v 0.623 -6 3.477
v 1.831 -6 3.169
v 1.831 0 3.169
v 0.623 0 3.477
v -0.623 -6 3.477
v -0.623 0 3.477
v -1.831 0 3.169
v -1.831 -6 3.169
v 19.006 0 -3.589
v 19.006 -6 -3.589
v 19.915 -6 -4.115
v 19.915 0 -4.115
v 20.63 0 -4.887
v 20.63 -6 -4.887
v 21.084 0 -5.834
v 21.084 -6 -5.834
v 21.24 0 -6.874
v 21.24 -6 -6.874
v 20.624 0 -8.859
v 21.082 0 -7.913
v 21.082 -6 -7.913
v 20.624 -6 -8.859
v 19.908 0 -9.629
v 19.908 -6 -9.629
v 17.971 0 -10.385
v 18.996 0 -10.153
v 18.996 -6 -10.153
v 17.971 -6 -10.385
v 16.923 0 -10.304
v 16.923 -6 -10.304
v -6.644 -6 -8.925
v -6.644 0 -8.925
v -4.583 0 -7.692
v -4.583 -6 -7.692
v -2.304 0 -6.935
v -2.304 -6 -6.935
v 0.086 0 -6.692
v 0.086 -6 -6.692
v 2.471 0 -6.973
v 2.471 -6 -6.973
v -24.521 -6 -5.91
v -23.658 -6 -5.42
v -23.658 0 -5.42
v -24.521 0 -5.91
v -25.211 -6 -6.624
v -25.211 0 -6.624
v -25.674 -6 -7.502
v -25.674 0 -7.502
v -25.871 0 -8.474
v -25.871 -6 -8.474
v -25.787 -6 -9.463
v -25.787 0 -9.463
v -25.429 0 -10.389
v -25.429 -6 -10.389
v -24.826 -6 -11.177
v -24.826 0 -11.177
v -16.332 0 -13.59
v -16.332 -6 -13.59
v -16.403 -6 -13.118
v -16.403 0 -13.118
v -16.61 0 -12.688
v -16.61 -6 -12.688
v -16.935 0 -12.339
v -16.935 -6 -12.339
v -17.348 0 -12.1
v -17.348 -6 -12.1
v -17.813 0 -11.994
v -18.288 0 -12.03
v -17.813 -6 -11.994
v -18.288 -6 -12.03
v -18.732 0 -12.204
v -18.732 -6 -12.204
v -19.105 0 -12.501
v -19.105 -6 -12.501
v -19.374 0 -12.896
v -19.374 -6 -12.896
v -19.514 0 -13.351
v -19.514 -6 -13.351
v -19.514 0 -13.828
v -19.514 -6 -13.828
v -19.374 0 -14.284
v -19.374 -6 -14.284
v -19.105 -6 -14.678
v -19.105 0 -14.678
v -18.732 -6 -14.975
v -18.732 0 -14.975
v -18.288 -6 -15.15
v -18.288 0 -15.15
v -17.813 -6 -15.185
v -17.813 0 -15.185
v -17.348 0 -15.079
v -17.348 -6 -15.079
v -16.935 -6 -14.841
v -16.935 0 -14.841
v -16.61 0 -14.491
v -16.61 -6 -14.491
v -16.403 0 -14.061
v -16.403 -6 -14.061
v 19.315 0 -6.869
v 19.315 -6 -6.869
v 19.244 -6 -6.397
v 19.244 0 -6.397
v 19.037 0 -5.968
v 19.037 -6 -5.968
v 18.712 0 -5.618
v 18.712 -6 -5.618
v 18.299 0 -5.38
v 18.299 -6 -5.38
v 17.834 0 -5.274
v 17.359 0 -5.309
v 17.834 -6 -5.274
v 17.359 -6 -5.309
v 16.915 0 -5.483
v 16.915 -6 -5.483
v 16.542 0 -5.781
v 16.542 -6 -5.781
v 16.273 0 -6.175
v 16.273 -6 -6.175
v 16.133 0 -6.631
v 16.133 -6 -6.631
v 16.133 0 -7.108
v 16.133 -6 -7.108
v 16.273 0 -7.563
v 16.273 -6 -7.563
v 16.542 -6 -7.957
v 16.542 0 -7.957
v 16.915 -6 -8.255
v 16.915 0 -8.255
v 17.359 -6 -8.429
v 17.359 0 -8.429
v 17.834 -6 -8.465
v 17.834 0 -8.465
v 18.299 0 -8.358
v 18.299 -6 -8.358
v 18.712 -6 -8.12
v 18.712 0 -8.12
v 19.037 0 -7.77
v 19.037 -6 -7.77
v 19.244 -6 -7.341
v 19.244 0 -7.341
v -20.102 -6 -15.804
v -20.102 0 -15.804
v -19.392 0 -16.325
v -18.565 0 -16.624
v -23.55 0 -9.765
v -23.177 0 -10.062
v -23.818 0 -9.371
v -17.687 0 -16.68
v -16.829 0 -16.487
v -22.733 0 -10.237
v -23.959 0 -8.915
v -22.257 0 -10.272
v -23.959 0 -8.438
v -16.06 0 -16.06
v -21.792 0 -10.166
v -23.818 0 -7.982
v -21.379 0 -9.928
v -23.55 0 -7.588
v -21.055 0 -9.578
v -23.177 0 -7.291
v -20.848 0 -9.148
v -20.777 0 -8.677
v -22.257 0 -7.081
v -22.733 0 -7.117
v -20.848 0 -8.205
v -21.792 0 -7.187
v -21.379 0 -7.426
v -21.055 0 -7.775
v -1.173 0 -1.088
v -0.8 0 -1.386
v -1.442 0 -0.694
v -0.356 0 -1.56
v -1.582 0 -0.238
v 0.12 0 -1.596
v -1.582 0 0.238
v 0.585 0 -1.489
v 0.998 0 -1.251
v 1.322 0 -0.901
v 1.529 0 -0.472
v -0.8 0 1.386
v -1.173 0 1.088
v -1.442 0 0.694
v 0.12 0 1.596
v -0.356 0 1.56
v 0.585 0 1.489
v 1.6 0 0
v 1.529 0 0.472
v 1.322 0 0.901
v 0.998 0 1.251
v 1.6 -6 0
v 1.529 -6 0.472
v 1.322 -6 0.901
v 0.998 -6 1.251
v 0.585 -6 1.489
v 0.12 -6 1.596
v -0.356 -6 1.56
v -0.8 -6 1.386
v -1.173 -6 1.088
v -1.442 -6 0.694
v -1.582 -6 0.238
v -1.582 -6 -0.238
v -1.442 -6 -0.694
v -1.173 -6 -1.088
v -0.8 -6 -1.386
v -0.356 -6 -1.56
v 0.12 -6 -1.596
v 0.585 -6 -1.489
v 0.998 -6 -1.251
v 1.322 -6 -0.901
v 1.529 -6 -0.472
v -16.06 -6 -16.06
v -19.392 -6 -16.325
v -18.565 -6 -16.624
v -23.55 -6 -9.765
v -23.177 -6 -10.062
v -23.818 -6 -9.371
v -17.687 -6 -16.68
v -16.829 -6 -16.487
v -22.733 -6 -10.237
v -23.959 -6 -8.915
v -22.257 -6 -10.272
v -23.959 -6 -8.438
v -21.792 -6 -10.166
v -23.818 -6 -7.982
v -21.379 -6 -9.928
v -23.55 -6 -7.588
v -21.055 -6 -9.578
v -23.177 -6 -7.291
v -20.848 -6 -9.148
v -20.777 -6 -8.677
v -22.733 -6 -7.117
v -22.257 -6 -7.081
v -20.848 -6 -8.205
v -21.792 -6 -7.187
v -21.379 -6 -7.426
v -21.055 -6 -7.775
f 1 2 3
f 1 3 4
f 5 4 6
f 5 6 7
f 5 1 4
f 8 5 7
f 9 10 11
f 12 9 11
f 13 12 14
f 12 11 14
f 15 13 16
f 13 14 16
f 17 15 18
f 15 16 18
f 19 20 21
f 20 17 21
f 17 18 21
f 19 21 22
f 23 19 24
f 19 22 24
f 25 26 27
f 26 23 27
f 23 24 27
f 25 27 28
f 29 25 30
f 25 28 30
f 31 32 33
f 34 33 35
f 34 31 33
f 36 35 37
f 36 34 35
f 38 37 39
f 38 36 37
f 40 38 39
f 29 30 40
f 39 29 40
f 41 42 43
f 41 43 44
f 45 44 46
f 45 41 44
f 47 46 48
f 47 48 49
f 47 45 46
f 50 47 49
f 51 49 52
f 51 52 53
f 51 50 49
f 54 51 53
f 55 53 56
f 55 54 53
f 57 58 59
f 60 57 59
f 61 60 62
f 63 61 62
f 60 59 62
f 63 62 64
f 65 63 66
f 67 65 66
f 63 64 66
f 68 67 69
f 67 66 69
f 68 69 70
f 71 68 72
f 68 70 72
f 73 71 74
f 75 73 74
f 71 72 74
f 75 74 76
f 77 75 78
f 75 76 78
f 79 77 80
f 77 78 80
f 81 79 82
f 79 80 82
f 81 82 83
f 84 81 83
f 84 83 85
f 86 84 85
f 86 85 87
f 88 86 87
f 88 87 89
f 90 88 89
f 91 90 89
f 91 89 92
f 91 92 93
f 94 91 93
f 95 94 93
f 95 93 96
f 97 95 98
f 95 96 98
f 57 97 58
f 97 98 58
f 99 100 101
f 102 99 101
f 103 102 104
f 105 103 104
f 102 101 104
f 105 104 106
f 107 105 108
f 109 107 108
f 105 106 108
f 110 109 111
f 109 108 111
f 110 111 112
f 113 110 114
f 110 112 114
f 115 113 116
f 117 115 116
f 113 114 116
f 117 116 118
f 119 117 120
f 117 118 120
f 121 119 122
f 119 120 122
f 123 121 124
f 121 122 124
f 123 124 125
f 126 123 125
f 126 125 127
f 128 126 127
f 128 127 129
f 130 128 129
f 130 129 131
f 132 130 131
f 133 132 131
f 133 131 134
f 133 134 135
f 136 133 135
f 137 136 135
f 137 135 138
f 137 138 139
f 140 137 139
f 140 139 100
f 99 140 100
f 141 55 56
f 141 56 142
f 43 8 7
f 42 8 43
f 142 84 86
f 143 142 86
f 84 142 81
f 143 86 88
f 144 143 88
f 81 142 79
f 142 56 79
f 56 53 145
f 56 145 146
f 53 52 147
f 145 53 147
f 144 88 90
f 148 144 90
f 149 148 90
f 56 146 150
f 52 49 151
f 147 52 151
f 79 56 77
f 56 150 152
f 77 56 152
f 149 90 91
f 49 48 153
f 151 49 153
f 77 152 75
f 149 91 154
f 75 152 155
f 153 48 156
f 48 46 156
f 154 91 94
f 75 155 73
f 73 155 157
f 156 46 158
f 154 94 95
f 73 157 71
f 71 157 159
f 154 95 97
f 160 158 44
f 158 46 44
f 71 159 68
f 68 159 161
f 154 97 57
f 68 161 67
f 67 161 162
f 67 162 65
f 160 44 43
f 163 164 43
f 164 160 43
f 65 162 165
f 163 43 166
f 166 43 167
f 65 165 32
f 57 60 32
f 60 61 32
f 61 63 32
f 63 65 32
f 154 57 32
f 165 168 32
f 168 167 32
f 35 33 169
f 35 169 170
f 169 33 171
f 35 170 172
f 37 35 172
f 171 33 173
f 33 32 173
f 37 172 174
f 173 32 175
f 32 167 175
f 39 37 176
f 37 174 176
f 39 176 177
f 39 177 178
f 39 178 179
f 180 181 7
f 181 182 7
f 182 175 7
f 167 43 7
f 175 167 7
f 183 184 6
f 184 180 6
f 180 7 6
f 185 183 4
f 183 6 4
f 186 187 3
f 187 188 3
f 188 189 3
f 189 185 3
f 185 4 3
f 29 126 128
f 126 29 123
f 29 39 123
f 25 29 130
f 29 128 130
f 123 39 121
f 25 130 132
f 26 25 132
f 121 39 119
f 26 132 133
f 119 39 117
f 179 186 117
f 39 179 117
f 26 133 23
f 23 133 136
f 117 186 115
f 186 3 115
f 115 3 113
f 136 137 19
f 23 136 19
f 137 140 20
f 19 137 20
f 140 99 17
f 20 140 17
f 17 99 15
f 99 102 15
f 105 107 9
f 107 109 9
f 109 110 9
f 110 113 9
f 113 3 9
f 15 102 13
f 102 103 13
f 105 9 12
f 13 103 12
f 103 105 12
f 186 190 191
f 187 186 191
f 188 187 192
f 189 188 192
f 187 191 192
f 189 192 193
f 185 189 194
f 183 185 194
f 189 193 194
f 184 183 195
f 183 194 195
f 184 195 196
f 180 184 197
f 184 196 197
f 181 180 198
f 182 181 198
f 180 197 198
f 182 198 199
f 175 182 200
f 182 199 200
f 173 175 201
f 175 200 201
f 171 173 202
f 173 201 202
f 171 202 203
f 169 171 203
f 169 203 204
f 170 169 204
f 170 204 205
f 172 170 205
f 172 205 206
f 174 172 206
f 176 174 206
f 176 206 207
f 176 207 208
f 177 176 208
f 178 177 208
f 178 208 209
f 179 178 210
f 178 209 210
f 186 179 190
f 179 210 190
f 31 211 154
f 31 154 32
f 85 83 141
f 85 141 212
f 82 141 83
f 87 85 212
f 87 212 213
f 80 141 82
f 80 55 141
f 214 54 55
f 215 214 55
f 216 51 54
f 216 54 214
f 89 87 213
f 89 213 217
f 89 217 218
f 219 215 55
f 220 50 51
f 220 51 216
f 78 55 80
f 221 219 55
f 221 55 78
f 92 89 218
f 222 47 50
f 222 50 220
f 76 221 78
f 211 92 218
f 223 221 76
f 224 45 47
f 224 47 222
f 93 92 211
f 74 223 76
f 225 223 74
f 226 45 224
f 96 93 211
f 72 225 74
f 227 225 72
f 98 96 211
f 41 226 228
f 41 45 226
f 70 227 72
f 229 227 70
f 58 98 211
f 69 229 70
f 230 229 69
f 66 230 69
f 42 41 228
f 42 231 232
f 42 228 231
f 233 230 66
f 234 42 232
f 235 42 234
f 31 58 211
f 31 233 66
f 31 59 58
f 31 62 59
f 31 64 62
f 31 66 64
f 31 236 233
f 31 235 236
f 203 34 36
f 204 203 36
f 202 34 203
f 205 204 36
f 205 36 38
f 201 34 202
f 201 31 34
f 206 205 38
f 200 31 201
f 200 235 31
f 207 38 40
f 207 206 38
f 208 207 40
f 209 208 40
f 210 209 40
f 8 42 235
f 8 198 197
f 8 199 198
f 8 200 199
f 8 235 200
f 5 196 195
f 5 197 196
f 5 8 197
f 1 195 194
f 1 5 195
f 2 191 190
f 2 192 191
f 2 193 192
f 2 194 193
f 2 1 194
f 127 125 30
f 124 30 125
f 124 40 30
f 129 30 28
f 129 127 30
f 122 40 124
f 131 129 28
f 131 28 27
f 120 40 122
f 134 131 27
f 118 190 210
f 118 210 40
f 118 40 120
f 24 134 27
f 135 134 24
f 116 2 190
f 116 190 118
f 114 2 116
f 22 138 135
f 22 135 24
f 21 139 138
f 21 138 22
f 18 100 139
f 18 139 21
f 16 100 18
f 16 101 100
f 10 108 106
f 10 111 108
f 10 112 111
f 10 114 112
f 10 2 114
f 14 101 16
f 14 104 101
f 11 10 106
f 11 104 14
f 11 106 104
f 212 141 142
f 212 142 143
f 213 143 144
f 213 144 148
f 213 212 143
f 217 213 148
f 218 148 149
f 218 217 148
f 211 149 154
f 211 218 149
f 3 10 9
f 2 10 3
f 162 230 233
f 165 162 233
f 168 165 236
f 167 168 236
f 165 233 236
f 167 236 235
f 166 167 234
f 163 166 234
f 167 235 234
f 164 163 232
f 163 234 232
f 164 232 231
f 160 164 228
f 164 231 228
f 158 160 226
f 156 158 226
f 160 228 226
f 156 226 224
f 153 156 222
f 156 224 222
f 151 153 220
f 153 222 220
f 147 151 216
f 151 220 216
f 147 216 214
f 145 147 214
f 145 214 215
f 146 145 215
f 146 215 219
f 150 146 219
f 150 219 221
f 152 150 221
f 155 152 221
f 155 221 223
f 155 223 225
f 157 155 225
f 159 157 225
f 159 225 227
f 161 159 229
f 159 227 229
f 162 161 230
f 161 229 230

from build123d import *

# Parameters (mm, degrees)
ESBO_O1_R                  = 1.6
RESSALTO_EXTRUS_O1_DEPTH   = 6
ESBO_O5_R                  = 1.6
RESSALTO_EXTRUS_O2_DEPTH   = 6
ESBO_O2_R                  = 1.6
CORTE_EXTRUS_O1_DEPTH      = 1
CORTE_EXTRUS_O1_DEPTH_BACK = 10


with BuildPart() as part:
    # Esboço1 → Ressalto-extrusão1 (new body)
    with BuildSketch(Plane.XZ.offset(6)):
        with BuildLine():
            Line((23.658239146, -5.419790473), (1.830835365, 3.169198905))
            ThreePointArc((1.830835365, 3.169198905), (0, 3.516453278), (-1.830835365, 3.169198905))
            Line((-1.830835365, 3.169198905), (-23.658239146, -5.419790473))
            ThreePointArc((-23.658239146, -5.419790473), (-25.806836409, -7.98111819), (-24.825744035, -11.177104364))
            Line((-24.825744035, -11.177104364), (-20.101514858, -15.804403192))
            ThreePointArc((-20.101514858, -15.804403192), (-18.128320556, -16.683568025), (-16.059952818, -16.060445681))
            Line((-16.059952818, -16.060445681), (-6.643887712, -8.924606384))
            ThreePointArc((-6.643887712, -8.924606384), (0, -6.691518958), (6.643887712, -8.924606384))
            Line((6.643887712, -8.924606384), (16.059952818, -16.060445681))
            ThreePointArc((16.059952818, -16.060445681), (18.128320556, -16.683568025), (20.101514858, -15.804403192))
            Line((20.101514858, -15.804403192), (24.825744035, -11.177104364))
            ThreePointArc((24.825744035, -11.177104364), (25.806836409, -7.98111819), (23.658239146, -5.419790473))
        make_face()
        with Locations((-17.932321173, -13.589770319)):
            Circle(ESBO_O1_R, mode=Mode.SUBTRACT)
        Circle(ESBO_O1_R, mode=Mode.SUBTRACT)
        with Locations((17.932321173, -13.589770319)):
            Circle(ESBO_O1_R, mode=Mode.SUBTRACT)
        with Locations((-22.376654391, -8.676712411)):
            Circle(ESBO_O1_R, mode=Mode.SUBTRACT)
        with Locations((22.376654391, -8.676712411)):
            Circle(ESBO_O1_R, mode=Mode.SUBTRACT)
    extrude(amount=-RESSALTO_EXTRUS_O1_DEPTH)

    # Esboço5 → Ressalto-extrusão2 (add)
    with BuildSketch(Plane.XZ.offset(6)):
        with Locations((17.932321173, -13.589770319)):
            Circle(ESBO_O5_R)
        with Locations((22.376654391, -8.676712411)):
            Circle(ESBO_O5_R)
    extrude(amount=-RESSALTO_EXTRUS_O2_DEPTH)

    # Esboço2 → Corte-extrusão1 (cut, two sides)
    with BuildSketch(Plane.XZ.offset(6)) as corte_extrus_o1_sk:
        with BuildLine():
            Line((16.923117575, -10.30388989), (2.470733648, -6.972588263))
            ThreePointArc((2.470733648, -6.972588263), (4.660651706, -7.727668012), (6.643887712, -8.924606384))
            Line((6.643887712, -8.924606384), (16.059952818, -16.060445681))
            ThreePointArc((16.059952818, -16.060445681), (18.128320556, -16.683568025), (20.101514858, -15.804403192))
            Line((20.101514858, -15.804403192), (24.825744035, -11.177104364))
            ThreePointArc((24.825744035, -11.177104364), (25.806836409, -7.98111819), (23.658239146, -5.419790473))
            Line((23.658239146, -5.419790473), (19.005551183, -3.588977798))
            ThreePointArc((19.005551183, -3.588977798), (21.081563864, -7.913151406), (16.923117575, -10.30388989))
        make_face()
        with Locations((17.714851393, -6.869063992)):
            Circle(ESBO_O2_R)
    extrude(amount=CORTE_EXTRUS_O1_DEPTH, mode=Mode.SUBTRACT)
    extrude(corte_extrus_o1_sk.sketch, amount=-CORTE_EXTRUS_O1_DEPTH_BACK, mode=Mode.SUBTRACT)


solid = part.part
